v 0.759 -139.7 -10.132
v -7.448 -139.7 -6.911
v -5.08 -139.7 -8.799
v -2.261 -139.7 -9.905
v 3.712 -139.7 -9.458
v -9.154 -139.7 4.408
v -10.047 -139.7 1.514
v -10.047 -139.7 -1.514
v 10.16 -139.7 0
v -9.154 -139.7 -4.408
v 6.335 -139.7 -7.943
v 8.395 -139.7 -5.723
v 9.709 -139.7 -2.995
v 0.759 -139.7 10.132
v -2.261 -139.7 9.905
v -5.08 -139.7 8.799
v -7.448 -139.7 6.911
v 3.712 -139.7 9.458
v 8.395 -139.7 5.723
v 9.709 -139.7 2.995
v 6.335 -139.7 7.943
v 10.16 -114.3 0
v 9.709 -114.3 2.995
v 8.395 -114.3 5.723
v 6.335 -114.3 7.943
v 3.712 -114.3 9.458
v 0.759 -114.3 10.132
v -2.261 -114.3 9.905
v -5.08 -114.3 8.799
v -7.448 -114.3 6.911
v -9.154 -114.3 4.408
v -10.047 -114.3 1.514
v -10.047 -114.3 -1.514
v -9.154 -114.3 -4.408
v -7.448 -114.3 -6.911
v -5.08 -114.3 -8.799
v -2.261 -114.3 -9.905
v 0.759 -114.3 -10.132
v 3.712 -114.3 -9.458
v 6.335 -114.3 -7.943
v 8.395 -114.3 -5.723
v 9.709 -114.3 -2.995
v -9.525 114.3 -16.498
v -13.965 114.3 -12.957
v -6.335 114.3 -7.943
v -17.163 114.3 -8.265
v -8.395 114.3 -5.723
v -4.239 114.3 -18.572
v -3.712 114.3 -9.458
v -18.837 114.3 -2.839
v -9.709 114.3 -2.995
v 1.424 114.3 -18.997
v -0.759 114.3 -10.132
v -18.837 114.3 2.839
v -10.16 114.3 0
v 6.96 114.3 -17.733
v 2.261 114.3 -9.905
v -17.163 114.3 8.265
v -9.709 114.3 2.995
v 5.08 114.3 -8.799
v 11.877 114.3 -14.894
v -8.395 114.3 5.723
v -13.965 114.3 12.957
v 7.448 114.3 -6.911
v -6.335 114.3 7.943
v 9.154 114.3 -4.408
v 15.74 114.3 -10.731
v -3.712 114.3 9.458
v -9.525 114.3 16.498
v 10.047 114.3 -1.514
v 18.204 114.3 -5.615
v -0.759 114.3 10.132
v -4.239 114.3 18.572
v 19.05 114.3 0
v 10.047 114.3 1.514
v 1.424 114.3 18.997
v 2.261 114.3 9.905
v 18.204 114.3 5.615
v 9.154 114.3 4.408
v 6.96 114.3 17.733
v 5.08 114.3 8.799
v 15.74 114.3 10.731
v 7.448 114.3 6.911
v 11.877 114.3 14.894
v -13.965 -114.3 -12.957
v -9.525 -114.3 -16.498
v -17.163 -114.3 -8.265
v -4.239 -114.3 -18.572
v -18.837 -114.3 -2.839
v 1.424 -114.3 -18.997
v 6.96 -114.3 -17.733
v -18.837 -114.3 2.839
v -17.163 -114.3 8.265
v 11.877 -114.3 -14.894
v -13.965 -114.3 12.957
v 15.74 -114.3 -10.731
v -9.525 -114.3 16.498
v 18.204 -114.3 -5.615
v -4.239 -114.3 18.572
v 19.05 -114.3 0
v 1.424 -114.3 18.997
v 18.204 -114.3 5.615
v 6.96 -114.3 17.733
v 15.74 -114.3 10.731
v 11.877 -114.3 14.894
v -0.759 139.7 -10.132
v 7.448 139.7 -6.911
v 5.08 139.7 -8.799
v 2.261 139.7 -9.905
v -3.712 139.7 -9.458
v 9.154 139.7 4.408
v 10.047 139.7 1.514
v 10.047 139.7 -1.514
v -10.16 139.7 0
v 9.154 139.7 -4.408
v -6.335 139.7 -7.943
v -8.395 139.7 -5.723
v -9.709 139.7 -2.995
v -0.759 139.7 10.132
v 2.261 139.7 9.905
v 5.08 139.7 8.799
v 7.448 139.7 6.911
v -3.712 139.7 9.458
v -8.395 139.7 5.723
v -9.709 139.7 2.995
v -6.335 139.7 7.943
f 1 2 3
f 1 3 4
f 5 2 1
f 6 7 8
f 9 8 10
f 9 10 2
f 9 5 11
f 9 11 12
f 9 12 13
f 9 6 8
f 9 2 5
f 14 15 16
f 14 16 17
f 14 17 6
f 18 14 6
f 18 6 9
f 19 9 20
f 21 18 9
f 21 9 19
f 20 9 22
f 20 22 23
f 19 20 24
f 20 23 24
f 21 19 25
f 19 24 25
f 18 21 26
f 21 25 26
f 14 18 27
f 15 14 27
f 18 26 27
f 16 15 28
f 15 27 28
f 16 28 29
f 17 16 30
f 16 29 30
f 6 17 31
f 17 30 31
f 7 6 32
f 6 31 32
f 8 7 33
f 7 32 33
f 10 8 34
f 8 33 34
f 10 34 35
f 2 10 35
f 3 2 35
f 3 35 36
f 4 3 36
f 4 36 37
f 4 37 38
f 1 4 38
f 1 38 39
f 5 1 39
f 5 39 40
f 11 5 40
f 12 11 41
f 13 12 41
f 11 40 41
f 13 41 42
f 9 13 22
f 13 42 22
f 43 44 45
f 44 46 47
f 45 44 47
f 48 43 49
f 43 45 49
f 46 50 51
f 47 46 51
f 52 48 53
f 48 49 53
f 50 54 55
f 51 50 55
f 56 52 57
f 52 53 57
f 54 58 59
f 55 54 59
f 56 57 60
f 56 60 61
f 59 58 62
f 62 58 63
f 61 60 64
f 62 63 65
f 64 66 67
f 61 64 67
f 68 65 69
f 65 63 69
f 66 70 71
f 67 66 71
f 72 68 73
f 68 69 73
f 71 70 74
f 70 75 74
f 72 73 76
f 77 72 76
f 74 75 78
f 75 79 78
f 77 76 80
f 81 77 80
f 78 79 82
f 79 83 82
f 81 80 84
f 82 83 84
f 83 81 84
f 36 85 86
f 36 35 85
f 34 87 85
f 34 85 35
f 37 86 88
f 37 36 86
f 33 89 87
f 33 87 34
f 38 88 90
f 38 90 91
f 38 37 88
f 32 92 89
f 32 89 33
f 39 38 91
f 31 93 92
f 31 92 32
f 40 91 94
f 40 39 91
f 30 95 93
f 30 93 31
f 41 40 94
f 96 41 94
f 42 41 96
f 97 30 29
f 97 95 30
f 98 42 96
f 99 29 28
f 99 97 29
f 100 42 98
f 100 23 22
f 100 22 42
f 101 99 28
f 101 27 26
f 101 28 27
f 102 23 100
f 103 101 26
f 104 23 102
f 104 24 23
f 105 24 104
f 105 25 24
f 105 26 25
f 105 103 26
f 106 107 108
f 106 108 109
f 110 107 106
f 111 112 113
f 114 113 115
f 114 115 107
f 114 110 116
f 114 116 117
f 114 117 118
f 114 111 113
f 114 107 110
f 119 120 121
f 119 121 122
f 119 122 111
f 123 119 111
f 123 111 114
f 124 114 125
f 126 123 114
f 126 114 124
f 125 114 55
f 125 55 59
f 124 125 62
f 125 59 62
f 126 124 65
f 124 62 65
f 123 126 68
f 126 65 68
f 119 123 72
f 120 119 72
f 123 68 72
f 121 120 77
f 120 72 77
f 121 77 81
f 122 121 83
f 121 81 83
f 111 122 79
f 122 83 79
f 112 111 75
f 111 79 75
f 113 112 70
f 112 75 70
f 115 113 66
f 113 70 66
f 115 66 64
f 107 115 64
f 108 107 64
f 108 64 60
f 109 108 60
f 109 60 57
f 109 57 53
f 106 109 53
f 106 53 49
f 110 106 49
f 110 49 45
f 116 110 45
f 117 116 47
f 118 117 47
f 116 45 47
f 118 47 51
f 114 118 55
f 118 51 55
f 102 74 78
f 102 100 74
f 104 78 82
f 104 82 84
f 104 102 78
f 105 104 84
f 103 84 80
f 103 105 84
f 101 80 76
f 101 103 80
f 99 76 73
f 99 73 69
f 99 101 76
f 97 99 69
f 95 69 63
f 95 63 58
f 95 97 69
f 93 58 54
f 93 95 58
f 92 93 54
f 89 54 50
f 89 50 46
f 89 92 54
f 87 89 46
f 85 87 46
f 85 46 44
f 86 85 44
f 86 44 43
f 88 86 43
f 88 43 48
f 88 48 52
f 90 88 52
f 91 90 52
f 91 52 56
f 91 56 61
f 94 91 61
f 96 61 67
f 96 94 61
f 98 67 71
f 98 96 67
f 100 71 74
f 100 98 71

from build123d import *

# Parameters (mm, degrees)
F0_R     = 19.05
F1_DEPTH = 114.3
F2_R     = 10.16
F3_DEPTH = 25.4
F4_R     = 10.16
F5_DEPTH = 25.4


with BuildPart() as f1:
    # F0 (on Front) → F1 (new body, symmetric)
    with BuildSketch(Plane.XZ):
        Circle(F0_R)
    extrude(amount=F1_DEPTH, both=True)

    # F2 (on face) → F3 (join)
    with BuildSketch(Plane(origin=(0, 114.3, 0), x_dir=(-1, 0, 0), z_dir=(0, 1, 0))):
        Circle(F2_R)
    extrude(amount=F3_DEPTH)

    # F4 (on face) → F5 (join)
    with BuildSketch(Plane.XZ.offset(114.3)):
        Circle(F4_R)
    extrude(amount=F5_DEPTH)


solid = f1.part
